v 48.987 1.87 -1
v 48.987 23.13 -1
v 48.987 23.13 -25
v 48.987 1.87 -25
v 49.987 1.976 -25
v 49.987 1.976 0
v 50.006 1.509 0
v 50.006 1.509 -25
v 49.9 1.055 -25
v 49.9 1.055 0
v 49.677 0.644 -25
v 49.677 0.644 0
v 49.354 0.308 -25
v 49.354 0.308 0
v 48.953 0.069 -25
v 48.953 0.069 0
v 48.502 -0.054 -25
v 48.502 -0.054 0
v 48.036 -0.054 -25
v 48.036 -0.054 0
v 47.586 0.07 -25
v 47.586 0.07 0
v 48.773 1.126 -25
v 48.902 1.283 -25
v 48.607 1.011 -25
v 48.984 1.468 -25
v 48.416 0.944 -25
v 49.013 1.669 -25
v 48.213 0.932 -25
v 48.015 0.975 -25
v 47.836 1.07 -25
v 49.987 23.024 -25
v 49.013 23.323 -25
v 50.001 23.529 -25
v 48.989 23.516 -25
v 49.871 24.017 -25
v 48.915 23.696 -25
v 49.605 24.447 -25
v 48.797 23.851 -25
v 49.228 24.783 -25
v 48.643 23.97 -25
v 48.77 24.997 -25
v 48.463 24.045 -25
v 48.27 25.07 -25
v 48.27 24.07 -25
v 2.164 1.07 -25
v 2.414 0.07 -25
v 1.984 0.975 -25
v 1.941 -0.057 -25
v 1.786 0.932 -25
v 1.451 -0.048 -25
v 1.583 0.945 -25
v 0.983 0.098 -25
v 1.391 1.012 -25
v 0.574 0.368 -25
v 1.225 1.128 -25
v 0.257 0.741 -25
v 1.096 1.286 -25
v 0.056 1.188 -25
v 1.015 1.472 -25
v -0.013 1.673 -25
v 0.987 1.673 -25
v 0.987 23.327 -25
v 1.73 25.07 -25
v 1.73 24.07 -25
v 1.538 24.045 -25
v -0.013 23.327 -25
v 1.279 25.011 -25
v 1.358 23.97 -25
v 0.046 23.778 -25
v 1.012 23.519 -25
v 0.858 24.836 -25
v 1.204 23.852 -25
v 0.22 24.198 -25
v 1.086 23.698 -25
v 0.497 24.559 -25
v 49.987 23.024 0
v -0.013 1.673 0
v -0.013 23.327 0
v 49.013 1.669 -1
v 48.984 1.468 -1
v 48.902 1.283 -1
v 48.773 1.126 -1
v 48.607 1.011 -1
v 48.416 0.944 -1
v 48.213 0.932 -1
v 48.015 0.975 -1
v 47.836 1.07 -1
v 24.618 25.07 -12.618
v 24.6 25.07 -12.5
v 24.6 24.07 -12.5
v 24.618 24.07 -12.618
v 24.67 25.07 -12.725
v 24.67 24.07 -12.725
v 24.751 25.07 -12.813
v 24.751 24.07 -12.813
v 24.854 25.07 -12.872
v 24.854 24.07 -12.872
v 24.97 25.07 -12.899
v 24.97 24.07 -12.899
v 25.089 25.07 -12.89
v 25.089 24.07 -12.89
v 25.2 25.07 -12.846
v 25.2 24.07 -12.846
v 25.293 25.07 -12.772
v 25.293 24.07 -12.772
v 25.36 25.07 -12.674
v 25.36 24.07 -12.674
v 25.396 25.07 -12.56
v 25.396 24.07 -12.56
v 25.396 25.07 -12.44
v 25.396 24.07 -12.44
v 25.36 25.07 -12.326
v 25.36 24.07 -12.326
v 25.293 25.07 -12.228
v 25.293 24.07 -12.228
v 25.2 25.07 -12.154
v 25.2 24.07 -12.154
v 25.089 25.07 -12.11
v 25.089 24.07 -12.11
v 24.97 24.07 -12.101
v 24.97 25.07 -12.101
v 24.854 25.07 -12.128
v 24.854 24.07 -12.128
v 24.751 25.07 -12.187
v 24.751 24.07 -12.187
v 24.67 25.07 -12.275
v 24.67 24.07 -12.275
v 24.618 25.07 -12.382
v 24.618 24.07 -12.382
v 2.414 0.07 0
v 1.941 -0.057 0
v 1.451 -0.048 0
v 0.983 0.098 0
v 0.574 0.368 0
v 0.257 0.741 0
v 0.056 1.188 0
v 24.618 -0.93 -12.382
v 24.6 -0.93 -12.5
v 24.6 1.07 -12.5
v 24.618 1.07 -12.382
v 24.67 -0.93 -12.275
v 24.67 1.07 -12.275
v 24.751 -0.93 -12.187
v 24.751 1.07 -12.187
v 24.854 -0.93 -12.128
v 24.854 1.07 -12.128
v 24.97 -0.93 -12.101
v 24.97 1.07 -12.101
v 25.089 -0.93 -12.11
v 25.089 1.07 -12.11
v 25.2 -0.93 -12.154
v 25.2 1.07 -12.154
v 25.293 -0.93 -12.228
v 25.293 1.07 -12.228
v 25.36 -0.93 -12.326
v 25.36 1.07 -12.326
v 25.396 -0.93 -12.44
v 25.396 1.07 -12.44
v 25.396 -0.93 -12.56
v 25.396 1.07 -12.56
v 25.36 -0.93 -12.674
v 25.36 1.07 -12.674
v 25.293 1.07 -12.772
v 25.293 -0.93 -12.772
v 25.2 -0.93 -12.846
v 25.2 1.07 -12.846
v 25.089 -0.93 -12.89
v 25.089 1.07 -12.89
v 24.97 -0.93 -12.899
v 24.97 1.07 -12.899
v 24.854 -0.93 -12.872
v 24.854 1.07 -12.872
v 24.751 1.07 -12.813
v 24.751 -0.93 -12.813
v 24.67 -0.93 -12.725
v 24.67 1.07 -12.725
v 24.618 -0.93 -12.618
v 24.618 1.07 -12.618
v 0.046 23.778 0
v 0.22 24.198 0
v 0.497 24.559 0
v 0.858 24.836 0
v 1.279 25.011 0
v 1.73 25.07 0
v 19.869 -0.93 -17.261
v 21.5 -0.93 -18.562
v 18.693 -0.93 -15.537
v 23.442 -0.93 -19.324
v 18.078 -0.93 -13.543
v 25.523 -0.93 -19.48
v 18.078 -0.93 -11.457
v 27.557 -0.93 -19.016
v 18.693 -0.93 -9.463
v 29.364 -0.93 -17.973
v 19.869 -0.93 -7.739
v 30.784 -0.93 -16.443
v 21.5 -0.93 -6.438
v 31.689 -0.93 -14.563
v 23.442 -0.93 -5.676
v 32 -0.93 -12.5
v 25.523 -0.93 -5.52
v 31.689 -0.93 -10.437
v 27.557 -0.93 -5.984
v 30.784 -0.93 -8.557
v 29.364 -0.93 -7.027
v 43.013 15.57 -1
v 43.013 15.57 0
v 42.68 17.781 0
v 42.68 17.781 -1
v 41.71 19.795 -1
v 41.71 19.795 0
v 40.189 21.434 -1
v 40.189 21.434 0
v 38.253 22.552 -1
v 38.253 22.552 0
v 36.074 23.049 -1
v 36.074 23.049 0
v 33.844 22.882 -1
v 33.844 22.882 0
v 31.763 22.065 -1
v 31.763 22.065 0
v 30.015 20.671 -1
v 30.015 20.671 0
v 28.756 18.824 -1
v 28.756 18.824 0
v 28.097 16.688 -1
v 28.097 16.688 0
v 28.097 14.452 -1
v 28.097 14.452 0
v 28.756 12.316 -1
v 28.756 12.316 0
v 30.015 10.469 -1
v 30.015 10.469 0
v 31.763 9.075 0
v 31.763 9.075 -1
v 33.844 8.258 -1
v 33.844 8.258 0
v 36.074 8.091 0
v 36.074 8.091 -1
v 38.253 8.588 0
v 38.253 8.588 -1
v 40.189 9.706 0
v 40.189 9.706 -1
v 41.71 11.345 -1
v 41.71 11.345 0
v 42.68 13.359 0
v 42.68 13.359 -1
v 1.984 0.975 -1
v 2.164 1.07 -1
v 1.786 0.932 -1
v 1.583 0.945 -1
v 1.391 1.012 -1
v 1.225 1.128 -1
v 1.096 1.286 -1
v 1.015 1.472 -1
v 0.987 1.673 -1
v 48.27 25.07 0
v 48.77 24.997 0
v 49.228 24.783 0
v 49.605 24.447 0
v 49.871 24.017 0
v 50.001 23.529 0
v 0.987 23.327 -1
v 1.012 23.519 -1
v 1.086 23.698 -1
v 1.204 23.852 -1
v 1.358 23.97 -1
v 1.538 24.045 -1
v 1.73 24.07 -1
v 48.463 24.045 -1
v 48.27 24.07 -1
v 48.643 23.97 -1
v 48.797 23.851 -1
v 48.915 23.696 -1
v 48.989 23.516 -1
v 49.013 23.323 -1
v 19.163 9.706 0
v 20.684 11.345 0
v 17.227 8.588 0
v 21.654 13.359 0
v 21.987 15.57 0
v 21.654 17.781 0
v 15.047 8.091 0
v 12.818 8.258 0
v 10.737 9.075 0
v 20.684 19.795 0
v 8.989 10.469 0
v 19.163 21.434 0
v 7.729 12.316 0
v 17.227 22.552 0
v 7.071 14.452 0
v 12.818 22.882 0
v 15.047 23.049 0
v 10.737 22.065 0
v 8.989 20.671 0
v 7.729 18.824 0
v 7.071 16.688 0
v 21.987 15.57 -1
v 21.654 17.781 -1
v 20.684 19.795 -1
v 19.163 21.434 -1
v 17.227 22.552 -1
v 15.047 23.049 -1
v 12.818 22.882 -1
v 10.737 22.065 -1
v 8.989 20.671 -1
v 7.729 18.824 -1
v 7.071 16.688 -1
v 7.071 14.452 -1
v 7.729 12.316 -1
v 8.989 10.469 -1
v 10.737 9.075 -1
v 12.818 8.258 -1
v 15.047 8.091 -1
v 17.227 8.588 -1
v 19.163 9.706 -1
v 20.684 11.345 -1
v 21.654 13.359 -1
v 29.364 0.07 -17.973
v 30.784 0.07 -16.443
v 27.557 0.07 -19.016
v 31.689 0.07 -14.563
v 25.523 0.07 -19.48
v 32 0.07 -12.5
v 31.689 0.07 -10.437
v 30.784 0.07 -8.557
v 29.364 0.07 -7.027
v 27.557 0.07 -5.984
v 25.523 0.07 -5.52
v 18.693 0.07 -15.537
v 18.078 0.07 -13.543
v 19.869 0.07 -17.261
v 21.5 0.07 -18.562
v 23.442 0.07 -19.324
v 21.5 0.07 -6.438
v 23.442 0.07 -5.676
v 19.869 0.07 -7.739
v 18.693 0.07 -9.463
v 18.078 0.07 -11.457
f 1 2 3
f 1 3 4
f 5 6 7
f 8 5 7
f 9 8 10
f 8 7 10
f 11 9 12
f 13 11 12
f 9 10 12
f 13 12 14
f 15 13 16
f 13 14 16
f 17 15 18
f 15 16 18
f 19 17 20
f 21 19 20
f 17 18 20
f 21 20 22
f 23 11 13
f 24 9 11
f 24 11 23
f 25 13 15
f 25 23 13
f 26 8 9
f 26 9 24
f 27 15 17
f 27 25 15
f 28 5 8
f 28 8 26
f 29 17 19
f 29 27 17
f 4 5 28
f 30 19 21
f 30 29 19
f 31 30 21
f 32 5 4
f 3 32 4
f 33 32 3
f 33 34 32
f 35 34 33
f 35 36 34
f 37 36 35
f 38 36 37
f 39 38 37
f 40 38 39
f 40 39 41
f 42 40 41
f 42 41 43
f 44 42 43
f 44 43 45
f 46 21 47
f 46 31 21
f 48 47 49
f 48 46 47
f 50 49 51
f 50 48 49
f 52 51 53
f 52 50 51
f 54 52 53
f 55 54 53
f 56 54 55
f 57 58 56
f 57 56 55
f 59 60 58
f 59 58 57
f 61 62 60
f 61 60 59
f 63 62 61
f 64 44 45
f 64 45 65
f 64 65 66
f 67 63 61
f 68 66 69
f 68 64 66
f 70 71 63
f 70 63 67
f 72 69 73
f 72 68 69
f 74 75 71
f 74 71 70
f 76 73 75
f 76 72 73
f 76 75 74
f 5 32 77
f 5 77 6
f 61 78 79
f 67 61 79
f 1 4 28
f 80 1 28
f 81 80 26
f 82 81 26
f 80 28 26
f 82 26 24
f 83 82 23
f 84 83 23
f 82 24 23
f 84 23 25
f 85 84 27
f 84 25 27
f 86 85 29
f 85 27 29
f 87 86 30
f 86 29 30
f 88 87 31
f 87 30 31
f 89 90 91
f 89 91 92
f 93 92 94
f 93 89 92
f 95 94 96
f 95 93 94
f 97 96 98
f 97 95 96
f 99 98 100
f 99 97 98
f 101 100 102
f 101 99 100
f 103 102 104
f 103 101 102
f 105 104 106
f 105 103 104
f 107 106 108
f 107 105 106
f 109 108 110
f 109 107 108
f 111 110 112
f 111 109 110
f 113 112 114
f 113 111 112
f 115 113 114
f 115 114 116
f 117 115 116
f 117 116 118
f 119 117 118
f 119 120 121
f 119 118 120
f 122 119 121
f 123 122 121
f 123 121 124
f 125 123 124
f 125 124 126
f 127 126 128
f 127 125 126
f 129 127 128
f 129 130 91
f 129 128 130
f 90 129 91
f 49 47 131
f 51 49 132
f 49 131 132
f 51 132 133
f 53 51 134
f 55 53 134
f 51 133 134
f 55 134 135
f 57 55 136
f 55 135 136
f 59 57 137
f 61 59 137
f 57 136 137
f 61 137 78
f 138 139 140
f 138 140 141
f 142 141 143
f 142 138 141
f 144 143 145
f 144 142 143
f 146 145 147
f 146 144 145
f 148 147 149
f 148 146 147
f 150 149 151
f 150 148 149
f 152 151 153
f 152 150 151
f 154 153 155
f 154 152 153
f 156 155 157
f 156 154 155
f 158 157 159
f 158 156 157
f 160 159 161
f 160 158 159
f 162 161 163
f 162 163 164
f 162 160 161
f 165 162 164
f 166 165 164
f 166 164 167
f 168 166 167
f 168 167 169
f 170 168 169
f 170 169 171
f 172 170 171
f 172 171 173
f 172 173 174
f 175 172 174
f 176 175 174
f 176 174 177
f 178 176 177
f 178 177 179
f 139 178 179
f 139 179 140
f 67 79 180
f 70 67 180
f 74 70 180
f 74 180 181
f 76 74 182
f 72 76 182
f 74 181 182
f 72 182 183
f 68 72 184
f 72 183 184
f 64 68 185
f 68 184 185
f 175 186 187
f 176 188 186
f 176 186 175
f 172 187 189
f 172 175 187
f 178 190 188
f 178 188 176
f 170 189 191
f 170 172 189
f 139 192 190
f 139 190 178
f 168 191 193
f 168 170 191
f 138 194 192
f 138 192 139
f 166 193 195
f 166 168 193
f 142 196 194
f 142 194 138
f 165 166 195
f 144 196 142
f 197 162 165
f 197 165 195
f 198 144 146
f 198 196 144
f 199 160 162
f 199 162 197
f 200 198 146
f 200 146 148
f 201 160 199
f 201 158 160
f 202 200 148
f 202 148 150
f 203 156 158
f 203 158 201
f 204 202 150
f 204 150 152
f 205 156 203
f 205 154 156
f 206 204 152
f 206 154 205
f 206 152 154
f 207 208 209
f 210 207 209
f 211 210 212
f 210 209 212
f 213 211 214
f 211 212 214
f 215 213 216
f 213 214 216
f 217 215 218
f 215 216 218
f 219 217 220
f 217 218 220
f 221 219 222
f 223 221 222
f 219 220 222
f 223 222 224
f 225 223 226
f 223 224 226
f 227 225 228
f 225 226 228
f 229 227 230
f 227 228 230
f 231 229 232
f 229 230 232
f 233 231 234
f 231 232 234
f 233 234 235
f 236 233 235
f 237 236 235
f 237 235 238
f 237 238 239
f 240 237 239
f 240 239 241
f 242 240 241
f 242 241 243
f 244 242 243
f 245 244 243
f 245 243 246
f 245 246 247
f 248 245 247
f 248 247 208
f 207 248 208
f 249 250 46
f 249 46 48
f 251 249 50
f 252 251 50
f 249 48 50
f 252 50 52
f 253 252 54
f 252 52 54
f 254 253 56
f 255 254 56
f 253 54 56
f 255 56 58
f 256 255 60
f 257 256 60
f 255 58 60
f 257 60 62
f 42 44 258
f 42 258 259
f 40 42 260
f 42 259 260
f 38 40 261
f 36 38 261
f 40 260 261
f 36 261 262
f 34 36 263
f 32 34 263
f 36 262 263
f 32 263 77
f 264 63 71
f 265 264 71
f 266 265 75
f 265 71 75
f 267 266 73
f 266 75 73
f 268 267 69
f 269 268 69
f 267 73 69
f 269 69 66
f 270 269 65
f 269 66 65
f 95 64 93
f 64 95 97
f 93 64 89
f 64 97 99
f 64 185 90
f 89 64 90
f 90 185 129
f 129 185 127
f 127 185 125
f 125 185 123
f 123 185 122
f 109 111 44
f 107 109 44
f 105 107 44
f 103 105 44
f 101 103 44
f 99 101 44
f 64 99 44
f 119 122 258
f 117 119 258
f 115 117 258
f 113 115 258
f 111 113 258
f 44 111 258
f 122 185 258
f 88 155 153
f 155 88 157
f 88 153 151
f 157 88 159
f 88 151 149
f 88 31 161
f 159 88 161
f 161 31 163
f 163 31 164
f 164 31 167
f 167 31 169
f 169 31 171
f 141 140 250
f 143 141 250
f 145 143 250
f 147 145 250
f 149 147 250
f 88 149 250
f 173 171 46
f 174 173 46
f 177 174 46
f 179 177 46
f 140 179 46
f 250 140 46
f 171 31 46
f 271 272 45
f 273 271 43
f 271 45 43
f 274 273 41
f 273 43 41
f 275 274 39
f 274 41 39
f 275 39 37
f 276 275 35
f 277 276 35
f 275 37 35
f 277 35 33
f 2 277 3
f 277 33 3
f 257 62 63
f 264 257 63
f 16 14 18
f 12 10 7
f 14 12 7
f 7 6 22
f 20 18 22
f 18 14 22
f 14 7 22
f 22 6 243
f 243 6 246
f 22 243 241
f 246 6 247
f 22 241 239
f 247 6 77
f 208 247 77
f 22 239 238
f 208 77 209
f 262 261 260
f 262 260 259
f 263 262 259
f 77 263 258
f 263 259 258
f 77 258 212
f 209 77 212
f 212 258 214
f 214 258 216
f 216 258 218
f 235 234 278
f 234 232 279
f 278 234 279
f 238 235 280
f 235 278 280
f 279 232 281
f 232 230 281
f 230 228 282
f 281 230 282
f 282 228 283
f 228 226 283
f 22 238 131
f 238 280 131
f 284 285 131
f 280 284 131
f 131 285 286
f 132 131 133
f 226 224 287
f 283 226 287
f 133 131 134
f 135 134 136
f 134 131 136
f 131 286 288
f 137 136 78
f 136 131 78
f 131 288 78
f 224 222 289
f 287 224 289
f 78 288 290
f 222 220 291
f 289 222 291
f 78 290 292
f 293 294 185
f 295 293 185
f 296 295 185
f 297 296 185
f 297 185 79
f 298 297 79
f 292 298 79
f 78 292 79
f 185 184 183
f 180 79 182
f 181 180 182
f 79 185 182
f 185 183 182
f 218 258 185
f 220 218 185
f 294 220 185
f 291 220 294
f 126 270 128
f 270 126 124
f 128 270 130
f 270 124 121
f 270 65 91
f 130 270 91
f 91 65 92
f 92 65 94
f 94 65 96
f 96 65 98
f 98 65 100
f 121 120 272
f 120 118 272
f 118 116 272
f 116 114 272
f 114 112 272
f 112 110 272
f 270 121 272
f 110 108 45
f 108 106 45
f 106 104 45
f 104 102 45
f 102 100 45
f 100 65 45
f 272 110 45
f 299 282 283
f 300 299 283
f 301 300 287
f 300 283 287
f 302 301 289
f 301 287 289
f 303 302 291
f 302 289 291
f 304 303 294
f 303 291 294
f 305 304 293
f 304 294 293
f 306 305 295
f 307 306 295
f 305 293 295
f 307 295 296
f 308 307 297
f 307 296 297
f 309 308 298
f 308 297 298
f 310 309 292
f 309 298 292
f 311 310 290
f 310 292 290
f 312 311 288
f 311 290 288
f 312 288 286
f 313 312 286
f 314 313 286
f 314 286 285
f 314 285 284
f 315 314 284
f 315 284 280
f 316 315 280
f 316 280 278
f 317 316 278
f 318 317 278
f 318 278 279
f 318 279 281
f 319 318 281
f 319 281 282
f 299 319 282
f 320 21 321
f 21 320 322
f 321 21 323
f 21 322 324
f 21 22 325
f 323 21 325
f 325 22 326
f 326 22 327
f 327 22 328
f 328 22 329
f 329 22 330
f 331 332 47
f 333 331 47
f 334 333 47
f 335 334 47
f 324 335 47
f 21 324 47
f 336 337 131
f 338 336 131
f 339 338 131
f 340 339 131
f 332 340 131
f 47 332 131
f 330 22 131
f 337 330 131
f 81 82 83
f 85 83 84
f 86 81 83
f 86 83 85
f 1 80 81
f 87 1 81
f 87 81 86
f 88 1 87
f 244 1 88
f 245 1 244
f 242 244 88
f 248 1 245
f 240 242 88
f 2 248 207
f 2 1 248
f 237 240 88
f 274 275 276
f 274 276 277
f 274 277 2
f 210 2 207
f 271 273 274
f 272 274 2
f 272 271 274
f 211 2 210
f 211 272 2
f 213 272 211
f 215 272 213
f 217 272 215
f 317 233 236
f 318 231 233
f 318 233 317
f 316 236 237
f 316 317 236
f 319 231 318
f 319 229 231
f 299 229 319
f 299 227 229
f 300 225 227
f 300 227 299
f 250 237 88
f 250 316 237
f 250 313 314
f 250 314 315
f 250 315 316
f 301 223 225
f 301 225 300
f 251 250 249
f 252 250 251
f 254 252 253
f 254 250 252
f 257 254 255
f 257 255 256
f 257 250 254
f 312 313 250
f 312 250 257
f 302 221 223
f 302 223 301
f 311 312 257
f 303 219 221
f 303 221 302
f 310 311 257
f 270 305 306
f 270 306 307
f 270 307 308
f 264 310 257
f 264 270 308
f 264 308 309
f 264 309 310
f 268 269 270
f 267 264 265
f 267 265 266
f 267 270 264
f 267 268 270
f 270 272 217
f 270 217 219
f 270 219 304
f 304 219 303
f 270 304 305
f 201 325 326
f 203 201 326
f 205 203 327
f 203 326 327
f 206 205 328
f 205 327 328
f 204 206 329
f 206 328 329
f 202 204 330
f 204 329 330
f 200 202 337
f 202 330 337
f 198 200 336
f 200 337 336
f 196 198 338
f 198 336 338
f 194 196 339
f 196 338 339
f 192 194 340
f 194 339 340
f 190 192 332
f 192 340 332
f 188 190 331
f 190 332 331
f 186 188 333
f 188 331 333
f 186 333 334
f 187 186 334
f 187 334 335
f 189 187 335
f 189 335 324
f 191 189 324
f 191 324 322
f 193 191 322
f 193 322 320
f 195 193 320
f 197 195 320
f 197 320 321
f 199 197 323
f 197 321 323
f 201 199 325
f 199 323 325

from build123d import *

# Parameters (mm, degrees)
SKETCH1_R               = 7.5
BOSS_EXTRUDE2_DEPTH     = 25
CUT_EXTRUDE1_DEPTH      = 24
CUT_EXTRUDE2_DEPTH      = 27
CUT_EXTRUDE2_DEPTH_BACK = 36
SKETCH3_R               = 0.4
SKETCH4_R               = 7
BOSS_EXTRUDE3_DEPTH     = 1
CUT_EXTRUDE3_START      = -11
SKETCH5_R               = 0.4
CUT_EXTRUDE3_DEPTH      = 11


with BuildPart() as part:
    # Sketch1 → Boss-Extrude2 (new body)
    with BuildSketch(Plane.XY):
        with BuildLine():
            ThreePointArc((2.414315168, 0.069999392), (0.769305306, 0.218548989), (-0.013240201, 1.673109733))
            Line((-0.013240201, 1.673109733), (-0.013240201, 23.326890267))
            ThreePointArc((-0.013240201, 23.326890267), (0.497304642, 24.55945455), (1.729868925, 25.069999392))
            Line((1.729868925, 25.069999392), (48.270131075, 25.069999392))
            ThreePointArc((48.270131075, 25.069999392), (49.605427649, 24.447342177), (49.986759799, 23.02421016))
            Line((49.986759799, 23.02421016), (49.986759799, 1.97578984))
            ThreePointArc((49.986759799, 1.97578984), (49.353809753, 0.307800264), (47.585684832, 0.069999392))
            Line((47.585684832, 0.069999392), (2.414315168, 0.069999392))
        make_face()
        with Locations((14.486759799, 15.569999392)):
            Circle(SKETCH1_R, mode=Mode.SUBTRACT)
        with Locations((35.513240201, 15.569999392)):
            Circle(SKETCH1_R, mode=Mode.SUBTRACT)
    extrude(amount=-BOSS_EXTRUDE2_DEPTH)

    # Sketch2 → Cut-Extrude1 (cut)
    with BuildSketch(Plane(origin=(0, 0, -25), x_dir=(-1, 0, 0), z_dir=(0, 0, -1))):
        with BuildLine():
            Line((-0.986759799, 1.673109733), (-0.986759799, 23.326890267))
            ThreePointArc((-0.986759799, 23.326890267), (-1.204411423, 23.852347769), (-1.729868925, 24.069999392))
            Line((-1.729868925, 24.069999392), (-48.270131075, 24.069999392))
            ThreePointArc((-48.270131075, 24.069999392), (-48.861025261, 23.777506771), (-48.986759799, 23.130282932))
            Line((-48.986759799, 23.130282932), (-48.986759799, 1.869717068))
            ThreePointArc((-48.986759799, 1.869717068), (-48.694204694, 1.062886218), (-47.836000807, 1.069999392))
            Line((-47.836000807, 1.069999392), (-2.163999193, 1.069999392))
            ThreePointArc((-2.163999193, 1.069999392), (-1.391043742, 1.011740949), (-0.986759799, 1.673109733))
        make_face()
    extrude(amount=-CUT_EXTRUDE1_DEPTH, mode=Mode.SUBTRACT)

    # Sketch3 → Cut-Extrude2 (cut, two sides: drawn at the far end of the back side and taken through both)
    with BuildSketch(Plane.XZ.offset(-0.069999392).offset(-CUT_EXTRUDE2_DEPTH_BACK)):
        with Locations(Location((25, -12.5, 0), (0, 0, 180))):
            Circle(SKETCH3_R)
    extrude(amount=CUT_EXTRUDE2_DEPTH + CUT_EXTRUDE2_DEPTH_BACK, mode=Mode.SUBTRACT)

    # Sketch4 → Boss-Extrude3 (add)
    with BuildSketch(Plane.XZ.offset(-0.069999392)):
        with Locations((25, -12.5)):
            Circle(SKETCH4_R)
    extrude(amount=BOSS_EXTRUDE3_DEPTH)

    # Sketch5 → Cut-Extrude3 (cut)
    with BuildSketch(Plane(origin=(0, 1.069999392, 0), x_dir=(1, 0, 0), z_dir=(0, 1, 0)).offset(CUT_EXTRUDE3_START)):
        with Locations(Location((25, 12.5, 0), (0, 0, 180))):
            Circle(SKETCH5_R)
    extrude(amount=CUT_EXTRUDE3_DEPTH, mode=Mode.SUBTRACT)


solid = part.part
